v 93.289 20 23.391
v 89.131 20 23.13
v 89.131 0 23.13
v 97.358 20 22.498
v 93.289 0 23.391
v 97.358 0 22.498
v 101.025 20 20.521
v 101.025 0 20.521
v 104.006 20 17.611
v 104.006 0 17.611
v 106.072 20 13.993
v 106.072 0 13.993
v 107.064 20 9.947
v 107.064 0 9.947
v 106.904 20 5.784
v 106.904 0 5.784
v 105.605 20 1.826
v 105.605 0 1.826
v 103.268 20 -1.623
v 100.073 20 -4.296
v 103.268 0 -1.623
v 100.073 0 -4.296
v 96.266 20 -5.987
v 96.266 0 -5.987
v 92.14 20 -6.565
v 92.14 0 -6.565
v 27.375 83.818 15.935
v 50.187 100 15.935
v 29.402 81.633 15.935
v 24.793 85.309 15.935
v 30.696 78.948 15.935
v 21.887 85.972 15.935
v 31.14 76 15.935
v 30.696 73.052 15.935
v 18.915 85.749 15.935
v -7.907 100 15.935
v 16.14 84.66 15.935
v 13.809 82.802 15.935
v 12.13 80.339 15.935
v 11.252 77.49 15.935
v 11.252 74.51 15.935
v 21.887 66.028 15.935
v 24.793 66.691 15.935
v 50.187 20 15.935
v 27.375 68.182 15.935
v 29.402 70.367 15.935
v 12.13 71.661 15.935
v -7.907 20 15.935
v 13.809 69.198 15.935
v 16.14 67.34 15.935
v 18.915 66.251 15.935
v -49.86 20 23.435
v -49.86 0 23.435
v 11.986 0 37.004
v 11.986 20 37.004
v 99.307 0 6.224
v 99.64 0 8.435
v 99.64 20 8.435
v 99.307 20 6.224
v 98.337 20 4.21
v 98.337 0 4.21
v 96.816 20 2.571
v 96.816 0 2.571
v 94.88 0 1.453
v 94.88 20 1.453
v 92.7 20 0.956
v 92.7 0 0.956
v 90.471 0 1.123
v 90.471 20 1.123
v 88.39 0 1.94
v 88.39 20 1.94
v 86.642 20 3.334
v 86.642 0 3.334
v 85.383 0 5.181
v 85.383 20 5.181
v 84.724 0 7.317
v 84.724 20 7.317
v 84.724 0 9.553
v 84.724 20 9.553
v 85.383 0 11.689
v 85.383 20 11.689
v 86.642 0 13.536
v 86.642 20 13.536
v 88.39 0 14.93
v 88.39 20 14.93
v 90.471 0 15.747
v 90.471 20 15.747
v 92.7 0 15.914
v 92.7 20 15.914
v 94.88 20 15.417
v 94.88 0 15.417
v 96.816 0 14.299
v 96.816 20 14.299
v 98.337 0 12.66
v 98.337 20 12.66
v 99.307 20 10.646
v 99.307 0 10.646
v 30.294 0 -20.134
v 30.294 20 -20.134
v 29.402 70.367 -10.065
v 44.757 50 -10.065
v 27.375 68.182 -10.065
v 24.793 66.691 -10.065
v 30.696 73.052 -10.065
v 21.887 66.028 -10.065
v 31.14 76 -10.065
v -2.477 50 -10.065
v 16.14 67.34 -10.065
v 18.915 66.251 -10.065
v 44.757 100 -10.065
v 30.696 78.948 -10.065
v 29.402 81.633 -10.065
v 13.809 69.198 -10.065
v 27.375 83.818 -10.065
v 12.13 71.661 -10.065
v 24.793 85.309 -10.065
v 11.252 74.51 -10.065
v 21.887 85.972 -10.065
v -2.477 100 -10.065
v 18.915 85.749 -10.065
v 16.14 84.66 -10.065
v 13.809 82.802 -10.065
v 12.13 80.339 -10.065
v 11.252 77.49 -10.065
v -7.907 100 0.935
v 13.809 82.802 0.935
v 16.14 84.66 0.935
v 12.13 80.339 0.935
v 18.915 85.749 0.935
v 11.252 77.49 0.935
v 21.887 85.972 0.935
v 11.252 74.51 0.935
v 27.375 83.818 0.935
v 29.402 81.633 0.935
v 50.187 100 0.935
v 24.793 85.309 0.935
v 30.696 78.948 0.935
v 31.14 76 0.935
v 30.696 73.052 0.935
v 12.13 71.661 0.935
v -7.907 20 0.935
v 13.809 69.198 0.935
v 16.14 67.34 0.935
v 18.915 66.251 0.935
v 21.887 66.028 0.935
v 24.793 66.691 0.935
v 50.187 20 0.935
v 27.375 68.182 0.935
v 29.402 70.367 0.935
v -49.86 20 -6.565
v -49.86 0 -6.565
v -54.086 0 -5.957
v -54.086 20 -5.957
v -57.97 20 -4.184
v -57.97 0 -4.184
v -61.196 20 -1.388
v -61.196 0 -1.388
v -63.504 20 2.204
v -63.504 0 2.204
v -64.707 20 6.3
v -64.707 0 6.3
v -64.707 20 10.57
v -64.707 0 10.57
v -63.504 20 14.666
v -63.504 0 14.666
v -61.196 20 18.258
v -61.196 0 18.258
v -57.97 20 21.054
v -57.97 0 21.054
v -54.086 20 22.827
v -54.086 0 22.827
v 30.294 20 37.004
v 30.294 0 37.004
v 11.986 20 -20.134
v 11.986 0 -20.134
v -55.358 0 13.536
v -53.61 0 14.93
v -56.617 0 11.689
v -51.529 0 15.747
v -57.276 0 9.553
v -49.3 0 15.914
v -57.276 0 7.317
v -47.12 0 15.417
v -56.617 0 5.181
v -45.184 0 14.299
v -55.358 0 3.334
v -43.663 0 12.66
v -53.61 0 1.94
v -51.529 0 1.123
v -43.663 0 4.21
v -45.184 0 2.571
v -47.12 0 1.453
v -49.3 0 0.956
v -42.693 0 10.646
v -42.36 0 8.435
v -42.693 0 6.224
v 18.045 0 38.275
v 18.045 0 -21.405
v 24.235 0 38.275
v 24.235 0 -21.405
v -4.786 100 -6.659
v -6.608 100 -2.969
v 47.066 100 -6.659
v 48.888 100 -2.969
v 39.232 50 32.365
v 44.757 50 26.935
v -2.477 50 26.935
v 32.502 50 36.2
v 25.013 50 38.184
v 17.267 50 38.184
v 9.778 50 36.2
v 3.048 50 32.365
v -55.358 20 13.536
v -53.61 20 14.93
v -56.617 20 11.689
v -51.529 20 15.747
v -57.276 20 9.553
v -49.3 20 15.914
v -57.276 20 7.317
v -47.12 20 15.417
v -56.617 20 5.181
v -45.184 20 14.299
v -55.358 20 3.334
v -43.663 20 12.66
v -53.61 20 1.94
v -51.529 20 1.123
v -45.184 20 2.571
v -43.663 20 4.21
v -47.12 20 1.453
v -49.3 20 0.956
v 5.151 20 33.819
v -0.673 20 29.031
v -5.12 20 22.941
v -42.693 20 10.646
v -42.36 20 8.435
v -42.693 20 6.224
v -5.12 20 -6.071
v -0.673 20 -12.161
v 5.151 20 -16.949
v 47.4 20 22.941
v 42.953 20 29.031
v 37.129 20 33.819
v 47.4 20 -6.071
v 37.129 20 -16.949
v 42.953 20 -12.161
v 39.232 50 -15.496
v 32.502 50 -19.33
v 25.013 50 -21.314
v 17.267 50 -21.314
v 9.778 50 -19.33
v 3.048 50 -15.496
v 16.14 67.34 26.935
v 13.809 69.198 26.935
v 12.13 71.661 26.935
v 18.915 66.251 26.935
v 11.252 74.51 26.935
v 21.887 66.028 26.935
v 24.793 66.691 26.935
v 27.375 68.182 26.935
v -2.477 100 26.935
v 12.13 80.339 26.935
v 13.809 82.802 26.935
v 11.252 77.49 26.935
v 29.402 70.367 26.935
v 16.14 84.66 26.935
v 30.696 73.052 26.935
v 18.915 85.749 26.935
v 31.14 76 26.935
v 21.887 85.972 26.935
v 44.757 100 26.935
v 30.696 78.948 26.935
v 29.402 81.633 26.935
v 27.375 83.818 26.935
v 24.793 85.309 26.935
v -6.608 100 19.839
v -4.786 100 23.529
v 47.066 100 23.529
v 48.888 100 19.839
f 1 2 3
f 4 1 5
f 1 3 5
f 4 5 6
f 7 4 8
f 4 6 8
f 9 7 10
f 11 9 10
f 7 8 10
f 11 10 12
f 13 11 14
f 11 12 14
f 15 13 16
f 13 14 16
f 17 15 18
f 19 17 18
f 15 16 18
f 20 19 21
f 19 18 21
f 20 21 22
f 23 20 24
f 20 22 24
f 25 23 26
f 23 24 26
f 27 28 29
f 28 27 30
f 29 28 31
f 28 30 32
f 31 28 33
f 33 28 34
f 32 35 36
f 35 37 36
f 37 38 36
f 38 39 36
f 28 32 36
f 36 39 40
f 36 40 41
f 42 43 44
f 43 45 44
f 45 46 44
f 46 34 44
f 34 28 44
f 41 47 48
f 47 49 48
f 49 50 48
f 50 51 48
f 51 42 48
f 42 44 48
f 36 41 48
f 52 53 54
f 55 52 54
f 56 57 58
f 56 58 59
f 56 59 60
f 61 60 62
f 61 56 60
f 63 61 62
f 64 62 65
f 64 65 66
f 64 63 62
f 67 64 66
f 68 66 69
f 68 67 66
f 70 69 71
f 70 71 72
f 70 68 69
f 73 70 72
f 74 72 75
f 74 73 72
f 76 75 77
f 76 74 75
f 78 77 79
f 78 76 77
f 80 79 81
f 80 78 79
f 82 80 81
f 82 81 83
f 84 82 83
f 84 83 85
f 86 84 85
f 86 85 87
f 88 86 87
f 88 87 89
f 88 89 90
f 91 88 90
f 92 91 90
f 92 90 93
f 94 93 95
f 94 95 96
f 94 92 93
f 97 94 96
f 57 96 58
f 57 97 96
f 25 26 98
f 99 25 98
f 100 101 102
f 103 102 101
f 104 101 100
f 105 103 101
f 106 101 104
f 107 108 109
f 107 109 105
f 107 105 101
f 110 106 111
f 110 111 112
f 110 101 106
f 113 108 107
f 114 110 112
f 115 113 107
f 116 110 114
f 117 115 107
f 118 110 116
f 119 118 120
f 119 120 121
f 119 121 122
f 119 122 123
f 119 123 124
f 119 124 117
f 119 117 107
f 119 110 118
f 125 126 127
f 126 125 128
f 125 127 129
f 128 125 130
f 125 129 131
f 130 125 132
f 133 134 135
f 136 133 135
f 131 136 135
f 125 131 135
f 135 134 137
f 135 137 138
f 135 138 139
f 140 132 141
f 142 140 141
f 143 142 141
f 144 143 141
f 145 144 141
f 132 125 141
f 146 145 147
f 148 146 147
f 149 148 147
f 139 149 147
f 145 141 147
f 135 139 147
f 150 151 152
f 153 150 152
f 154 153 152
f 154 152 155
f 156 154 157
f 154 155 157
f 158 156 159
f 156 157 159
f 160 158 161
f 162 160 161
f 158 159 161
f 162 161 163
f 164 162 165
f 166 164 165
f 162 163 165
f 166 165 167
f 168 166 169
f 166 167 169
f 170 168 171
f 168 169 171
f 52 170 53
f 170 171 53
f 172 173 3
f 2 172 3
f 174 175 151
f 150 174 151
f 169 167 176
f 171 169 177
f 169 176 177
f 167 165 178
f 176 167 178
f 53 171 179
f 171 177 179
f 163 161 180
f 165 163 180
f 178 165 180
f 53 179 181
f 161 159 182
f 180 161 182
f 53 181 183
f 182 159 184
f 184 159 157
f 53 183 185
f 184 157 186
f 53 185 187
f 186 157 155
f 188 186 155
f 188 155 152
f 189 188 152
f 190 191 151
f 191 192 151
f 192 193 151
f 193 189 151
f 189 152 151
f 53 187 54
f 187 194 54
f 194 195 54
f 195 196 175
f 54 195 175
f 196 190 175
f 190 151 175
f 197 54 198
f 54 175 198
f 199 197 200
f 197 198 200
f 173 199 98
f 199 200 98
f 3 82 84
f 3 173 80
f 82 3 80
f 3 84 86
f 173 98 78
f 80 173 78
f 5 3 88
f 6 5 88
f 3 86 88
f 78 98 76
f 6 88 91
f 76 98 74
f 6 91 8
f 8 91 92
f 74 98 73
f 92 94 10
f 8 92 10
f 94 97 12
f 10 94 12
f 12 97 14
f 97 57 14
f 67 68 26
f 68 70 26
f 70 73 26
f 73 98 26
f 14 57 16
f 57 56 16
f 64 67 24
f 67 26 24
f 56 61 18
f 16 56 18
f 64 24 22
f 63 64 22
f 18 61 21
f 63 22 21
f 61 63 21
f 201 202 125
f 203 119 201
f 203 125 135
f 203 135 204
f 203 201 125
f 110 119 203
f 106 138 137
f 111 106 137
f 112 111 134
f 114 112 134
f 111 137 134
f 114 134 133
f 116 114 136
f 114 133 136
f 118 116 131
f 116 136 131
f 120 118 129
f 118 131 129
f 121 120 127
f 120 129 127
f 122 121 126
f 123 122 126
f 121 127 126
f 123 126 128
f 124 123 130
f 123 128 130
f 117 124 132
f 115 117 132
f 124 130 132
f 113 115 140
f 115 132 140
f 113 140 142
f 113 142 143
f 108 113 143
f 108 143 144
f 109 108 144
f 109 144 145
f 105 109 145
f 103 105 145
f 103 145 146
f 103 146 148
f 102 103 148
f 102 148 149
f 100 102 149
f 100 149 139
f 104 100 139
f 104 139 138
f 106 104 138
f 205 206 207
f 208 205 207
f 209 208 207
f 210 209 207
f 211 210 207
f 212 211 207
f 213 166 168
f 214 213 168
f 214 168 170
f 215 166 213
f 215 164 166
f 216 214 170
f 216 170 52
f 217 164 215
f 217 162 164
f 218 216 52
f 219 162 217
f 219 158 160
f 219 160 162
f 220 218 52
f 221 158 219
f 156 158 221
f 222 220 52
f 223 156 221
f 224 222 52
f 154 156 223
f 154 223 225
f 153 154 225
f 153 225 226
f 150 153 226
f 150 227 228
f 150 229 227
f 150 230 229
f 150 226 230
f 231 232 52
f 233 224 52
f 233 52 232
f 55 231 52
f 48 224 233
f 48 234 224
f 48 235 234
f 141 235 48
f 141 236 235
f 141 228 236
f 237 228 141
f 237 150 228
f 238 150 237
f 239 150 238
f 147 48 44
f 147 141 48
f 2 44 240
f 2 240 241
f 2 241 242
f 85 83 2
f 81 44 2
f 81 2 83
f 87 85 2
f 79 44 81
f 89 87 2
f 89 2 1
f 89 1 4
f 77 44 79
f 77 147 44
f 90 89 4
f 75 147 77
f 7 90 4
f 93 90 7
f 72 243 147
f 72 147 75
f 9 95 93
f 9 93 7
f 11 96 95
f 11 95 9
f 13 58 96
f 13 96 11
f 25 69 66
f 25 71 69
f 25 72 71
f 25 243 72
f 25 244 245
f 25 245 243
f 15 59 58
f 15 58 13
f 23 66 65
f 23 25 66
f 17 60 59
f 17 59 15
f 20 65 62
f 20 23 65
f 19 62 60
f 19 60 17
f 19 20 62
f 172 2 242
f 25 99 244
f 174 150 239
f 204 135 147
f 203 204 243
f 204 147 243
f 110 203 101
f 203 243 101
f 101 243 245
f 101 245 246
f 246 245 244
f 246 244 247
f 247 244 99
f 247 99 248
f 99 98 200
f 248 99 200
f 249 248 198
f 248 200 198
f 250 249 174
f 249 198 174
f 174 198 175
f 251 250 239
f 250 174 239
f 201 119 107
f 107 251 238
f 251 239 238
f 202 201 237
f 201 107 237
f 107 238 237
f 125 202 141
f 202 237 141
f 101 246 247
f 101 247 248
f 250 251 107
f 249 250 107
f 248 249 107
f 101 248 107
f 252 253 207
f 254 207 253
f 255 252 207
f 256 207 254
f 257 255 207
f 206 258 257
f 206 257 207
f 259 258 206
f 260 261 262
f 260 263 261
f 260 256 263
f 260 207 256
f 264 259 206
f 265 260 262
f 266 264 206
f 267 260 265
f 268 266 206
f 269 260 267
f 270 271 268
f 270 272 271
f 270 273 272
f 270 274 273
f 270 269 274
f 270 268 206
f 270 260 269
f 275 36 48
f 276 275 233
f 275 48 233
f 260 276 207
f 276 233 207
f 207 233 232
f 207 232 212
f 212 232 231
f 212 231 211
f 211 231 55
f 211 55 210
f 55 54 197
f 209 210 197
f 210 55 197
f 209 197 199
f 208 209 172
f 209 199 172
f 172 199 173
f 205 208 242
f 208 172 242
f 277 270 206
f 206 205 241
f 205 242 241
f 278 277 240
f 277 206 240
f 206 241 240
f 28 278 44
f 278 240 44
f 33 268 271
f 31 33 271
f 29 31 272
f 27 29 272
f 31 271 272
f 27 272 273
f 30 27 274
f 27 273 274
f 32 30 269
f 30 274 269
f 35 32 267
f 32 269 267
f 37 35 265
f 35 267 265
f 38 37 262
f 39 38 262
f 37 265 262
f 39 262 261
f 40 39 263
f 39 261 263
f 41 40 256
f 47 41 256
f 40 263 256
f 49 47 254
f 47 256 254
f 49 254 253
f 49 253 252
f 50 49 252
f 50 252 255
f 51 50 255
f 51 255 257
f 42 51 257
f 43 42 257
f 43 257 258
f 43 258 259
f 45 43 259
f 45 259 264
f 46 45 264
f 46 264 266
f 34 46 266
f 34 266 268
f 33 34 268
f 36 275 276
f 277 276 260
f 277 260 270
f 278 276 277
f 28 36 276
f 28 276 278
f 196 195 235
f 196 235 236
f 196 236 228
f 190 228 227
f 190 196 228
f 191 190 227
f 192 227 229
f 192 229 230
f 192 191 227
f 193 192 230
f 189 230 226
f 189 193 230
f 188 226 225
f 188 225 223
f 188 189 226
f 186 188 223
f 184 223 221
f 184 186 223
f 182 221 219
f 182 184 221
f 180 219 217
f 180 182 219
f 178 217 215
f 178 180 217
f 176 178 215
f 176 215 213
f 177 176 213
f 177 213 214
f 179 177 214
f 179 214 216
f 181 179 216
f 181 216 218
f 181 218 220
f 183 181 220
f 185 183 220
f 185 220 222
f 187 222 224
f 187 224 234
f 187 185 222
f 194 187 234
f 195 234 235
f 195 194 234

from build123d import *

# Parameters (mm, degrees)
SKETCH1_R               = 7.5
BOSS_EXTRUDE1_DEPTH     = 20
BOSS_EXTRUDE2_DEPTH     = 100
CUT_EXTRUDE1_DEPTH      = 50
SKETCH4_R               = 10
CUT_EXTRUDE2_DEPTH      = 30
CUT_EXTRUDE2_DEPTH_BACK = 119


with BuildPart() as part:
    # Sketch1 → Boss-Extrude1 (new body)
    with BuildSketch(Plane(origin=(0, 0, 0), x_dir=(1, 0, 0), z_dir=(0, 1, 0))):
        with BuildLine():
            Line((-49.860018769, -23.434965581), (11.985981198, -37.004254746))
            ThreePointArc((11.985981198, -37.004254746), (21.139981231, -38.434965581), (30.293981265, -37.004254746))
            Line((30.293981265, -37.004254746), (89.131173769, -23.130103473))
            ThreePointArc((89.131173769, -23.130103473), (107.063571087, -9.947071997), (92.139981231, 6.565034419))
            Line((92.139981231, 6.565034419), (30.293981265, 20.134323584))
            ThreePointArc((30.293981265, 20.134323584), (21.139981231, 21.565034419), (11.985981198, 20.134323584))
            Line((11.985981198, 20.134323584), (-49.860018769, 6.565034419))
            ThreePointArc((-49.860018769, 6.565034419), (-64.860018769, -8.434965581), (-49.860018769, -23.434965581))
        make_face()
        with Locations((-49.860018769, -8.434965581)):
            Circle(SKETCH1_R, mode=Mode.SUBTRACT)
        with Locations((92.139981231, -8.434965581)):
            Circle(SKETCH1_R, mode=Mode.SUBTRACT)
    extrude(amount=BOSS_EXTRUDE1_DEPTH)

    # Sketch2 → Boss-Extrude2 (add)
    with BuildSketch(Plane(origin=(0, 0, 0), x_dir=(1, 0, 0), z_dir=(0, 1, 0))):
        with BuildLine():
            Line((-7.907393865, -0.934965581), (50.187356328, -0.934965581))
            ThreePointArc((50.187356328, -0.934965581), (21.139981231, 21.565034419), (-7.907393865, -0.934965581))
        make_face()
        with BuildLine():
            Line((50.187356328, -15.934965581), (-7.907393865, -15.934965581))
            ThreePointArc((-7.907393865, -15.934965581), (21.139981231, -38.434965581), (50.187356328, -15.934965581))
        make_face()
    extrude(amount=BOSS_EXTRUDE2_DEPTH)

    # Sketch3 → Cut-Extrude1 (cut)
    with BuildSketch(Plane(origin=(0, 100, 0), x_dir=(1, 0, 0), z_dir=(0, 1, 0))):
        with BuildLine():
            Line((-2.476750126, -26.934965581), (44.756712589, -26.934965581))
            ThreePointArc((44.756712589, -26.934965581), (21.139981231, -38.434965581), (-2.476750126, -26.934965581))
        make_face()
        with BuildLine():
            Line((44.756712589, 10.065034419), (-2.476750126, 10.065034419))
            ThreePointArc((-2.476750126, 10.065034419), (21.139981231, 21.565034419), (44.756712589, 10.065034419))
        make_face()
    extrude(amount=-CUT_EXTRUDE1_DEPTH, mode=Mode.SUBTRACT)

    # Sketch4 → Cut-Extrude2 (cut, two sides)
    with BuildSketch(Plane.XY.offset(26.934965581)) as cut_extrude2_sk:
        with Locations((21.139981231, 76)):
            Circle(SKETCH4_R)
    extrude(amount=CUT_EXTRUDE2_DEPTH, mode=Mode.SUBTRACT)
    extrude(cut_extrude2_sk.sketch, amount=-CUT_EXTRUDE2_DEPTH_BACK, mode=Mode.SUBTRACT)


solid = part.part
